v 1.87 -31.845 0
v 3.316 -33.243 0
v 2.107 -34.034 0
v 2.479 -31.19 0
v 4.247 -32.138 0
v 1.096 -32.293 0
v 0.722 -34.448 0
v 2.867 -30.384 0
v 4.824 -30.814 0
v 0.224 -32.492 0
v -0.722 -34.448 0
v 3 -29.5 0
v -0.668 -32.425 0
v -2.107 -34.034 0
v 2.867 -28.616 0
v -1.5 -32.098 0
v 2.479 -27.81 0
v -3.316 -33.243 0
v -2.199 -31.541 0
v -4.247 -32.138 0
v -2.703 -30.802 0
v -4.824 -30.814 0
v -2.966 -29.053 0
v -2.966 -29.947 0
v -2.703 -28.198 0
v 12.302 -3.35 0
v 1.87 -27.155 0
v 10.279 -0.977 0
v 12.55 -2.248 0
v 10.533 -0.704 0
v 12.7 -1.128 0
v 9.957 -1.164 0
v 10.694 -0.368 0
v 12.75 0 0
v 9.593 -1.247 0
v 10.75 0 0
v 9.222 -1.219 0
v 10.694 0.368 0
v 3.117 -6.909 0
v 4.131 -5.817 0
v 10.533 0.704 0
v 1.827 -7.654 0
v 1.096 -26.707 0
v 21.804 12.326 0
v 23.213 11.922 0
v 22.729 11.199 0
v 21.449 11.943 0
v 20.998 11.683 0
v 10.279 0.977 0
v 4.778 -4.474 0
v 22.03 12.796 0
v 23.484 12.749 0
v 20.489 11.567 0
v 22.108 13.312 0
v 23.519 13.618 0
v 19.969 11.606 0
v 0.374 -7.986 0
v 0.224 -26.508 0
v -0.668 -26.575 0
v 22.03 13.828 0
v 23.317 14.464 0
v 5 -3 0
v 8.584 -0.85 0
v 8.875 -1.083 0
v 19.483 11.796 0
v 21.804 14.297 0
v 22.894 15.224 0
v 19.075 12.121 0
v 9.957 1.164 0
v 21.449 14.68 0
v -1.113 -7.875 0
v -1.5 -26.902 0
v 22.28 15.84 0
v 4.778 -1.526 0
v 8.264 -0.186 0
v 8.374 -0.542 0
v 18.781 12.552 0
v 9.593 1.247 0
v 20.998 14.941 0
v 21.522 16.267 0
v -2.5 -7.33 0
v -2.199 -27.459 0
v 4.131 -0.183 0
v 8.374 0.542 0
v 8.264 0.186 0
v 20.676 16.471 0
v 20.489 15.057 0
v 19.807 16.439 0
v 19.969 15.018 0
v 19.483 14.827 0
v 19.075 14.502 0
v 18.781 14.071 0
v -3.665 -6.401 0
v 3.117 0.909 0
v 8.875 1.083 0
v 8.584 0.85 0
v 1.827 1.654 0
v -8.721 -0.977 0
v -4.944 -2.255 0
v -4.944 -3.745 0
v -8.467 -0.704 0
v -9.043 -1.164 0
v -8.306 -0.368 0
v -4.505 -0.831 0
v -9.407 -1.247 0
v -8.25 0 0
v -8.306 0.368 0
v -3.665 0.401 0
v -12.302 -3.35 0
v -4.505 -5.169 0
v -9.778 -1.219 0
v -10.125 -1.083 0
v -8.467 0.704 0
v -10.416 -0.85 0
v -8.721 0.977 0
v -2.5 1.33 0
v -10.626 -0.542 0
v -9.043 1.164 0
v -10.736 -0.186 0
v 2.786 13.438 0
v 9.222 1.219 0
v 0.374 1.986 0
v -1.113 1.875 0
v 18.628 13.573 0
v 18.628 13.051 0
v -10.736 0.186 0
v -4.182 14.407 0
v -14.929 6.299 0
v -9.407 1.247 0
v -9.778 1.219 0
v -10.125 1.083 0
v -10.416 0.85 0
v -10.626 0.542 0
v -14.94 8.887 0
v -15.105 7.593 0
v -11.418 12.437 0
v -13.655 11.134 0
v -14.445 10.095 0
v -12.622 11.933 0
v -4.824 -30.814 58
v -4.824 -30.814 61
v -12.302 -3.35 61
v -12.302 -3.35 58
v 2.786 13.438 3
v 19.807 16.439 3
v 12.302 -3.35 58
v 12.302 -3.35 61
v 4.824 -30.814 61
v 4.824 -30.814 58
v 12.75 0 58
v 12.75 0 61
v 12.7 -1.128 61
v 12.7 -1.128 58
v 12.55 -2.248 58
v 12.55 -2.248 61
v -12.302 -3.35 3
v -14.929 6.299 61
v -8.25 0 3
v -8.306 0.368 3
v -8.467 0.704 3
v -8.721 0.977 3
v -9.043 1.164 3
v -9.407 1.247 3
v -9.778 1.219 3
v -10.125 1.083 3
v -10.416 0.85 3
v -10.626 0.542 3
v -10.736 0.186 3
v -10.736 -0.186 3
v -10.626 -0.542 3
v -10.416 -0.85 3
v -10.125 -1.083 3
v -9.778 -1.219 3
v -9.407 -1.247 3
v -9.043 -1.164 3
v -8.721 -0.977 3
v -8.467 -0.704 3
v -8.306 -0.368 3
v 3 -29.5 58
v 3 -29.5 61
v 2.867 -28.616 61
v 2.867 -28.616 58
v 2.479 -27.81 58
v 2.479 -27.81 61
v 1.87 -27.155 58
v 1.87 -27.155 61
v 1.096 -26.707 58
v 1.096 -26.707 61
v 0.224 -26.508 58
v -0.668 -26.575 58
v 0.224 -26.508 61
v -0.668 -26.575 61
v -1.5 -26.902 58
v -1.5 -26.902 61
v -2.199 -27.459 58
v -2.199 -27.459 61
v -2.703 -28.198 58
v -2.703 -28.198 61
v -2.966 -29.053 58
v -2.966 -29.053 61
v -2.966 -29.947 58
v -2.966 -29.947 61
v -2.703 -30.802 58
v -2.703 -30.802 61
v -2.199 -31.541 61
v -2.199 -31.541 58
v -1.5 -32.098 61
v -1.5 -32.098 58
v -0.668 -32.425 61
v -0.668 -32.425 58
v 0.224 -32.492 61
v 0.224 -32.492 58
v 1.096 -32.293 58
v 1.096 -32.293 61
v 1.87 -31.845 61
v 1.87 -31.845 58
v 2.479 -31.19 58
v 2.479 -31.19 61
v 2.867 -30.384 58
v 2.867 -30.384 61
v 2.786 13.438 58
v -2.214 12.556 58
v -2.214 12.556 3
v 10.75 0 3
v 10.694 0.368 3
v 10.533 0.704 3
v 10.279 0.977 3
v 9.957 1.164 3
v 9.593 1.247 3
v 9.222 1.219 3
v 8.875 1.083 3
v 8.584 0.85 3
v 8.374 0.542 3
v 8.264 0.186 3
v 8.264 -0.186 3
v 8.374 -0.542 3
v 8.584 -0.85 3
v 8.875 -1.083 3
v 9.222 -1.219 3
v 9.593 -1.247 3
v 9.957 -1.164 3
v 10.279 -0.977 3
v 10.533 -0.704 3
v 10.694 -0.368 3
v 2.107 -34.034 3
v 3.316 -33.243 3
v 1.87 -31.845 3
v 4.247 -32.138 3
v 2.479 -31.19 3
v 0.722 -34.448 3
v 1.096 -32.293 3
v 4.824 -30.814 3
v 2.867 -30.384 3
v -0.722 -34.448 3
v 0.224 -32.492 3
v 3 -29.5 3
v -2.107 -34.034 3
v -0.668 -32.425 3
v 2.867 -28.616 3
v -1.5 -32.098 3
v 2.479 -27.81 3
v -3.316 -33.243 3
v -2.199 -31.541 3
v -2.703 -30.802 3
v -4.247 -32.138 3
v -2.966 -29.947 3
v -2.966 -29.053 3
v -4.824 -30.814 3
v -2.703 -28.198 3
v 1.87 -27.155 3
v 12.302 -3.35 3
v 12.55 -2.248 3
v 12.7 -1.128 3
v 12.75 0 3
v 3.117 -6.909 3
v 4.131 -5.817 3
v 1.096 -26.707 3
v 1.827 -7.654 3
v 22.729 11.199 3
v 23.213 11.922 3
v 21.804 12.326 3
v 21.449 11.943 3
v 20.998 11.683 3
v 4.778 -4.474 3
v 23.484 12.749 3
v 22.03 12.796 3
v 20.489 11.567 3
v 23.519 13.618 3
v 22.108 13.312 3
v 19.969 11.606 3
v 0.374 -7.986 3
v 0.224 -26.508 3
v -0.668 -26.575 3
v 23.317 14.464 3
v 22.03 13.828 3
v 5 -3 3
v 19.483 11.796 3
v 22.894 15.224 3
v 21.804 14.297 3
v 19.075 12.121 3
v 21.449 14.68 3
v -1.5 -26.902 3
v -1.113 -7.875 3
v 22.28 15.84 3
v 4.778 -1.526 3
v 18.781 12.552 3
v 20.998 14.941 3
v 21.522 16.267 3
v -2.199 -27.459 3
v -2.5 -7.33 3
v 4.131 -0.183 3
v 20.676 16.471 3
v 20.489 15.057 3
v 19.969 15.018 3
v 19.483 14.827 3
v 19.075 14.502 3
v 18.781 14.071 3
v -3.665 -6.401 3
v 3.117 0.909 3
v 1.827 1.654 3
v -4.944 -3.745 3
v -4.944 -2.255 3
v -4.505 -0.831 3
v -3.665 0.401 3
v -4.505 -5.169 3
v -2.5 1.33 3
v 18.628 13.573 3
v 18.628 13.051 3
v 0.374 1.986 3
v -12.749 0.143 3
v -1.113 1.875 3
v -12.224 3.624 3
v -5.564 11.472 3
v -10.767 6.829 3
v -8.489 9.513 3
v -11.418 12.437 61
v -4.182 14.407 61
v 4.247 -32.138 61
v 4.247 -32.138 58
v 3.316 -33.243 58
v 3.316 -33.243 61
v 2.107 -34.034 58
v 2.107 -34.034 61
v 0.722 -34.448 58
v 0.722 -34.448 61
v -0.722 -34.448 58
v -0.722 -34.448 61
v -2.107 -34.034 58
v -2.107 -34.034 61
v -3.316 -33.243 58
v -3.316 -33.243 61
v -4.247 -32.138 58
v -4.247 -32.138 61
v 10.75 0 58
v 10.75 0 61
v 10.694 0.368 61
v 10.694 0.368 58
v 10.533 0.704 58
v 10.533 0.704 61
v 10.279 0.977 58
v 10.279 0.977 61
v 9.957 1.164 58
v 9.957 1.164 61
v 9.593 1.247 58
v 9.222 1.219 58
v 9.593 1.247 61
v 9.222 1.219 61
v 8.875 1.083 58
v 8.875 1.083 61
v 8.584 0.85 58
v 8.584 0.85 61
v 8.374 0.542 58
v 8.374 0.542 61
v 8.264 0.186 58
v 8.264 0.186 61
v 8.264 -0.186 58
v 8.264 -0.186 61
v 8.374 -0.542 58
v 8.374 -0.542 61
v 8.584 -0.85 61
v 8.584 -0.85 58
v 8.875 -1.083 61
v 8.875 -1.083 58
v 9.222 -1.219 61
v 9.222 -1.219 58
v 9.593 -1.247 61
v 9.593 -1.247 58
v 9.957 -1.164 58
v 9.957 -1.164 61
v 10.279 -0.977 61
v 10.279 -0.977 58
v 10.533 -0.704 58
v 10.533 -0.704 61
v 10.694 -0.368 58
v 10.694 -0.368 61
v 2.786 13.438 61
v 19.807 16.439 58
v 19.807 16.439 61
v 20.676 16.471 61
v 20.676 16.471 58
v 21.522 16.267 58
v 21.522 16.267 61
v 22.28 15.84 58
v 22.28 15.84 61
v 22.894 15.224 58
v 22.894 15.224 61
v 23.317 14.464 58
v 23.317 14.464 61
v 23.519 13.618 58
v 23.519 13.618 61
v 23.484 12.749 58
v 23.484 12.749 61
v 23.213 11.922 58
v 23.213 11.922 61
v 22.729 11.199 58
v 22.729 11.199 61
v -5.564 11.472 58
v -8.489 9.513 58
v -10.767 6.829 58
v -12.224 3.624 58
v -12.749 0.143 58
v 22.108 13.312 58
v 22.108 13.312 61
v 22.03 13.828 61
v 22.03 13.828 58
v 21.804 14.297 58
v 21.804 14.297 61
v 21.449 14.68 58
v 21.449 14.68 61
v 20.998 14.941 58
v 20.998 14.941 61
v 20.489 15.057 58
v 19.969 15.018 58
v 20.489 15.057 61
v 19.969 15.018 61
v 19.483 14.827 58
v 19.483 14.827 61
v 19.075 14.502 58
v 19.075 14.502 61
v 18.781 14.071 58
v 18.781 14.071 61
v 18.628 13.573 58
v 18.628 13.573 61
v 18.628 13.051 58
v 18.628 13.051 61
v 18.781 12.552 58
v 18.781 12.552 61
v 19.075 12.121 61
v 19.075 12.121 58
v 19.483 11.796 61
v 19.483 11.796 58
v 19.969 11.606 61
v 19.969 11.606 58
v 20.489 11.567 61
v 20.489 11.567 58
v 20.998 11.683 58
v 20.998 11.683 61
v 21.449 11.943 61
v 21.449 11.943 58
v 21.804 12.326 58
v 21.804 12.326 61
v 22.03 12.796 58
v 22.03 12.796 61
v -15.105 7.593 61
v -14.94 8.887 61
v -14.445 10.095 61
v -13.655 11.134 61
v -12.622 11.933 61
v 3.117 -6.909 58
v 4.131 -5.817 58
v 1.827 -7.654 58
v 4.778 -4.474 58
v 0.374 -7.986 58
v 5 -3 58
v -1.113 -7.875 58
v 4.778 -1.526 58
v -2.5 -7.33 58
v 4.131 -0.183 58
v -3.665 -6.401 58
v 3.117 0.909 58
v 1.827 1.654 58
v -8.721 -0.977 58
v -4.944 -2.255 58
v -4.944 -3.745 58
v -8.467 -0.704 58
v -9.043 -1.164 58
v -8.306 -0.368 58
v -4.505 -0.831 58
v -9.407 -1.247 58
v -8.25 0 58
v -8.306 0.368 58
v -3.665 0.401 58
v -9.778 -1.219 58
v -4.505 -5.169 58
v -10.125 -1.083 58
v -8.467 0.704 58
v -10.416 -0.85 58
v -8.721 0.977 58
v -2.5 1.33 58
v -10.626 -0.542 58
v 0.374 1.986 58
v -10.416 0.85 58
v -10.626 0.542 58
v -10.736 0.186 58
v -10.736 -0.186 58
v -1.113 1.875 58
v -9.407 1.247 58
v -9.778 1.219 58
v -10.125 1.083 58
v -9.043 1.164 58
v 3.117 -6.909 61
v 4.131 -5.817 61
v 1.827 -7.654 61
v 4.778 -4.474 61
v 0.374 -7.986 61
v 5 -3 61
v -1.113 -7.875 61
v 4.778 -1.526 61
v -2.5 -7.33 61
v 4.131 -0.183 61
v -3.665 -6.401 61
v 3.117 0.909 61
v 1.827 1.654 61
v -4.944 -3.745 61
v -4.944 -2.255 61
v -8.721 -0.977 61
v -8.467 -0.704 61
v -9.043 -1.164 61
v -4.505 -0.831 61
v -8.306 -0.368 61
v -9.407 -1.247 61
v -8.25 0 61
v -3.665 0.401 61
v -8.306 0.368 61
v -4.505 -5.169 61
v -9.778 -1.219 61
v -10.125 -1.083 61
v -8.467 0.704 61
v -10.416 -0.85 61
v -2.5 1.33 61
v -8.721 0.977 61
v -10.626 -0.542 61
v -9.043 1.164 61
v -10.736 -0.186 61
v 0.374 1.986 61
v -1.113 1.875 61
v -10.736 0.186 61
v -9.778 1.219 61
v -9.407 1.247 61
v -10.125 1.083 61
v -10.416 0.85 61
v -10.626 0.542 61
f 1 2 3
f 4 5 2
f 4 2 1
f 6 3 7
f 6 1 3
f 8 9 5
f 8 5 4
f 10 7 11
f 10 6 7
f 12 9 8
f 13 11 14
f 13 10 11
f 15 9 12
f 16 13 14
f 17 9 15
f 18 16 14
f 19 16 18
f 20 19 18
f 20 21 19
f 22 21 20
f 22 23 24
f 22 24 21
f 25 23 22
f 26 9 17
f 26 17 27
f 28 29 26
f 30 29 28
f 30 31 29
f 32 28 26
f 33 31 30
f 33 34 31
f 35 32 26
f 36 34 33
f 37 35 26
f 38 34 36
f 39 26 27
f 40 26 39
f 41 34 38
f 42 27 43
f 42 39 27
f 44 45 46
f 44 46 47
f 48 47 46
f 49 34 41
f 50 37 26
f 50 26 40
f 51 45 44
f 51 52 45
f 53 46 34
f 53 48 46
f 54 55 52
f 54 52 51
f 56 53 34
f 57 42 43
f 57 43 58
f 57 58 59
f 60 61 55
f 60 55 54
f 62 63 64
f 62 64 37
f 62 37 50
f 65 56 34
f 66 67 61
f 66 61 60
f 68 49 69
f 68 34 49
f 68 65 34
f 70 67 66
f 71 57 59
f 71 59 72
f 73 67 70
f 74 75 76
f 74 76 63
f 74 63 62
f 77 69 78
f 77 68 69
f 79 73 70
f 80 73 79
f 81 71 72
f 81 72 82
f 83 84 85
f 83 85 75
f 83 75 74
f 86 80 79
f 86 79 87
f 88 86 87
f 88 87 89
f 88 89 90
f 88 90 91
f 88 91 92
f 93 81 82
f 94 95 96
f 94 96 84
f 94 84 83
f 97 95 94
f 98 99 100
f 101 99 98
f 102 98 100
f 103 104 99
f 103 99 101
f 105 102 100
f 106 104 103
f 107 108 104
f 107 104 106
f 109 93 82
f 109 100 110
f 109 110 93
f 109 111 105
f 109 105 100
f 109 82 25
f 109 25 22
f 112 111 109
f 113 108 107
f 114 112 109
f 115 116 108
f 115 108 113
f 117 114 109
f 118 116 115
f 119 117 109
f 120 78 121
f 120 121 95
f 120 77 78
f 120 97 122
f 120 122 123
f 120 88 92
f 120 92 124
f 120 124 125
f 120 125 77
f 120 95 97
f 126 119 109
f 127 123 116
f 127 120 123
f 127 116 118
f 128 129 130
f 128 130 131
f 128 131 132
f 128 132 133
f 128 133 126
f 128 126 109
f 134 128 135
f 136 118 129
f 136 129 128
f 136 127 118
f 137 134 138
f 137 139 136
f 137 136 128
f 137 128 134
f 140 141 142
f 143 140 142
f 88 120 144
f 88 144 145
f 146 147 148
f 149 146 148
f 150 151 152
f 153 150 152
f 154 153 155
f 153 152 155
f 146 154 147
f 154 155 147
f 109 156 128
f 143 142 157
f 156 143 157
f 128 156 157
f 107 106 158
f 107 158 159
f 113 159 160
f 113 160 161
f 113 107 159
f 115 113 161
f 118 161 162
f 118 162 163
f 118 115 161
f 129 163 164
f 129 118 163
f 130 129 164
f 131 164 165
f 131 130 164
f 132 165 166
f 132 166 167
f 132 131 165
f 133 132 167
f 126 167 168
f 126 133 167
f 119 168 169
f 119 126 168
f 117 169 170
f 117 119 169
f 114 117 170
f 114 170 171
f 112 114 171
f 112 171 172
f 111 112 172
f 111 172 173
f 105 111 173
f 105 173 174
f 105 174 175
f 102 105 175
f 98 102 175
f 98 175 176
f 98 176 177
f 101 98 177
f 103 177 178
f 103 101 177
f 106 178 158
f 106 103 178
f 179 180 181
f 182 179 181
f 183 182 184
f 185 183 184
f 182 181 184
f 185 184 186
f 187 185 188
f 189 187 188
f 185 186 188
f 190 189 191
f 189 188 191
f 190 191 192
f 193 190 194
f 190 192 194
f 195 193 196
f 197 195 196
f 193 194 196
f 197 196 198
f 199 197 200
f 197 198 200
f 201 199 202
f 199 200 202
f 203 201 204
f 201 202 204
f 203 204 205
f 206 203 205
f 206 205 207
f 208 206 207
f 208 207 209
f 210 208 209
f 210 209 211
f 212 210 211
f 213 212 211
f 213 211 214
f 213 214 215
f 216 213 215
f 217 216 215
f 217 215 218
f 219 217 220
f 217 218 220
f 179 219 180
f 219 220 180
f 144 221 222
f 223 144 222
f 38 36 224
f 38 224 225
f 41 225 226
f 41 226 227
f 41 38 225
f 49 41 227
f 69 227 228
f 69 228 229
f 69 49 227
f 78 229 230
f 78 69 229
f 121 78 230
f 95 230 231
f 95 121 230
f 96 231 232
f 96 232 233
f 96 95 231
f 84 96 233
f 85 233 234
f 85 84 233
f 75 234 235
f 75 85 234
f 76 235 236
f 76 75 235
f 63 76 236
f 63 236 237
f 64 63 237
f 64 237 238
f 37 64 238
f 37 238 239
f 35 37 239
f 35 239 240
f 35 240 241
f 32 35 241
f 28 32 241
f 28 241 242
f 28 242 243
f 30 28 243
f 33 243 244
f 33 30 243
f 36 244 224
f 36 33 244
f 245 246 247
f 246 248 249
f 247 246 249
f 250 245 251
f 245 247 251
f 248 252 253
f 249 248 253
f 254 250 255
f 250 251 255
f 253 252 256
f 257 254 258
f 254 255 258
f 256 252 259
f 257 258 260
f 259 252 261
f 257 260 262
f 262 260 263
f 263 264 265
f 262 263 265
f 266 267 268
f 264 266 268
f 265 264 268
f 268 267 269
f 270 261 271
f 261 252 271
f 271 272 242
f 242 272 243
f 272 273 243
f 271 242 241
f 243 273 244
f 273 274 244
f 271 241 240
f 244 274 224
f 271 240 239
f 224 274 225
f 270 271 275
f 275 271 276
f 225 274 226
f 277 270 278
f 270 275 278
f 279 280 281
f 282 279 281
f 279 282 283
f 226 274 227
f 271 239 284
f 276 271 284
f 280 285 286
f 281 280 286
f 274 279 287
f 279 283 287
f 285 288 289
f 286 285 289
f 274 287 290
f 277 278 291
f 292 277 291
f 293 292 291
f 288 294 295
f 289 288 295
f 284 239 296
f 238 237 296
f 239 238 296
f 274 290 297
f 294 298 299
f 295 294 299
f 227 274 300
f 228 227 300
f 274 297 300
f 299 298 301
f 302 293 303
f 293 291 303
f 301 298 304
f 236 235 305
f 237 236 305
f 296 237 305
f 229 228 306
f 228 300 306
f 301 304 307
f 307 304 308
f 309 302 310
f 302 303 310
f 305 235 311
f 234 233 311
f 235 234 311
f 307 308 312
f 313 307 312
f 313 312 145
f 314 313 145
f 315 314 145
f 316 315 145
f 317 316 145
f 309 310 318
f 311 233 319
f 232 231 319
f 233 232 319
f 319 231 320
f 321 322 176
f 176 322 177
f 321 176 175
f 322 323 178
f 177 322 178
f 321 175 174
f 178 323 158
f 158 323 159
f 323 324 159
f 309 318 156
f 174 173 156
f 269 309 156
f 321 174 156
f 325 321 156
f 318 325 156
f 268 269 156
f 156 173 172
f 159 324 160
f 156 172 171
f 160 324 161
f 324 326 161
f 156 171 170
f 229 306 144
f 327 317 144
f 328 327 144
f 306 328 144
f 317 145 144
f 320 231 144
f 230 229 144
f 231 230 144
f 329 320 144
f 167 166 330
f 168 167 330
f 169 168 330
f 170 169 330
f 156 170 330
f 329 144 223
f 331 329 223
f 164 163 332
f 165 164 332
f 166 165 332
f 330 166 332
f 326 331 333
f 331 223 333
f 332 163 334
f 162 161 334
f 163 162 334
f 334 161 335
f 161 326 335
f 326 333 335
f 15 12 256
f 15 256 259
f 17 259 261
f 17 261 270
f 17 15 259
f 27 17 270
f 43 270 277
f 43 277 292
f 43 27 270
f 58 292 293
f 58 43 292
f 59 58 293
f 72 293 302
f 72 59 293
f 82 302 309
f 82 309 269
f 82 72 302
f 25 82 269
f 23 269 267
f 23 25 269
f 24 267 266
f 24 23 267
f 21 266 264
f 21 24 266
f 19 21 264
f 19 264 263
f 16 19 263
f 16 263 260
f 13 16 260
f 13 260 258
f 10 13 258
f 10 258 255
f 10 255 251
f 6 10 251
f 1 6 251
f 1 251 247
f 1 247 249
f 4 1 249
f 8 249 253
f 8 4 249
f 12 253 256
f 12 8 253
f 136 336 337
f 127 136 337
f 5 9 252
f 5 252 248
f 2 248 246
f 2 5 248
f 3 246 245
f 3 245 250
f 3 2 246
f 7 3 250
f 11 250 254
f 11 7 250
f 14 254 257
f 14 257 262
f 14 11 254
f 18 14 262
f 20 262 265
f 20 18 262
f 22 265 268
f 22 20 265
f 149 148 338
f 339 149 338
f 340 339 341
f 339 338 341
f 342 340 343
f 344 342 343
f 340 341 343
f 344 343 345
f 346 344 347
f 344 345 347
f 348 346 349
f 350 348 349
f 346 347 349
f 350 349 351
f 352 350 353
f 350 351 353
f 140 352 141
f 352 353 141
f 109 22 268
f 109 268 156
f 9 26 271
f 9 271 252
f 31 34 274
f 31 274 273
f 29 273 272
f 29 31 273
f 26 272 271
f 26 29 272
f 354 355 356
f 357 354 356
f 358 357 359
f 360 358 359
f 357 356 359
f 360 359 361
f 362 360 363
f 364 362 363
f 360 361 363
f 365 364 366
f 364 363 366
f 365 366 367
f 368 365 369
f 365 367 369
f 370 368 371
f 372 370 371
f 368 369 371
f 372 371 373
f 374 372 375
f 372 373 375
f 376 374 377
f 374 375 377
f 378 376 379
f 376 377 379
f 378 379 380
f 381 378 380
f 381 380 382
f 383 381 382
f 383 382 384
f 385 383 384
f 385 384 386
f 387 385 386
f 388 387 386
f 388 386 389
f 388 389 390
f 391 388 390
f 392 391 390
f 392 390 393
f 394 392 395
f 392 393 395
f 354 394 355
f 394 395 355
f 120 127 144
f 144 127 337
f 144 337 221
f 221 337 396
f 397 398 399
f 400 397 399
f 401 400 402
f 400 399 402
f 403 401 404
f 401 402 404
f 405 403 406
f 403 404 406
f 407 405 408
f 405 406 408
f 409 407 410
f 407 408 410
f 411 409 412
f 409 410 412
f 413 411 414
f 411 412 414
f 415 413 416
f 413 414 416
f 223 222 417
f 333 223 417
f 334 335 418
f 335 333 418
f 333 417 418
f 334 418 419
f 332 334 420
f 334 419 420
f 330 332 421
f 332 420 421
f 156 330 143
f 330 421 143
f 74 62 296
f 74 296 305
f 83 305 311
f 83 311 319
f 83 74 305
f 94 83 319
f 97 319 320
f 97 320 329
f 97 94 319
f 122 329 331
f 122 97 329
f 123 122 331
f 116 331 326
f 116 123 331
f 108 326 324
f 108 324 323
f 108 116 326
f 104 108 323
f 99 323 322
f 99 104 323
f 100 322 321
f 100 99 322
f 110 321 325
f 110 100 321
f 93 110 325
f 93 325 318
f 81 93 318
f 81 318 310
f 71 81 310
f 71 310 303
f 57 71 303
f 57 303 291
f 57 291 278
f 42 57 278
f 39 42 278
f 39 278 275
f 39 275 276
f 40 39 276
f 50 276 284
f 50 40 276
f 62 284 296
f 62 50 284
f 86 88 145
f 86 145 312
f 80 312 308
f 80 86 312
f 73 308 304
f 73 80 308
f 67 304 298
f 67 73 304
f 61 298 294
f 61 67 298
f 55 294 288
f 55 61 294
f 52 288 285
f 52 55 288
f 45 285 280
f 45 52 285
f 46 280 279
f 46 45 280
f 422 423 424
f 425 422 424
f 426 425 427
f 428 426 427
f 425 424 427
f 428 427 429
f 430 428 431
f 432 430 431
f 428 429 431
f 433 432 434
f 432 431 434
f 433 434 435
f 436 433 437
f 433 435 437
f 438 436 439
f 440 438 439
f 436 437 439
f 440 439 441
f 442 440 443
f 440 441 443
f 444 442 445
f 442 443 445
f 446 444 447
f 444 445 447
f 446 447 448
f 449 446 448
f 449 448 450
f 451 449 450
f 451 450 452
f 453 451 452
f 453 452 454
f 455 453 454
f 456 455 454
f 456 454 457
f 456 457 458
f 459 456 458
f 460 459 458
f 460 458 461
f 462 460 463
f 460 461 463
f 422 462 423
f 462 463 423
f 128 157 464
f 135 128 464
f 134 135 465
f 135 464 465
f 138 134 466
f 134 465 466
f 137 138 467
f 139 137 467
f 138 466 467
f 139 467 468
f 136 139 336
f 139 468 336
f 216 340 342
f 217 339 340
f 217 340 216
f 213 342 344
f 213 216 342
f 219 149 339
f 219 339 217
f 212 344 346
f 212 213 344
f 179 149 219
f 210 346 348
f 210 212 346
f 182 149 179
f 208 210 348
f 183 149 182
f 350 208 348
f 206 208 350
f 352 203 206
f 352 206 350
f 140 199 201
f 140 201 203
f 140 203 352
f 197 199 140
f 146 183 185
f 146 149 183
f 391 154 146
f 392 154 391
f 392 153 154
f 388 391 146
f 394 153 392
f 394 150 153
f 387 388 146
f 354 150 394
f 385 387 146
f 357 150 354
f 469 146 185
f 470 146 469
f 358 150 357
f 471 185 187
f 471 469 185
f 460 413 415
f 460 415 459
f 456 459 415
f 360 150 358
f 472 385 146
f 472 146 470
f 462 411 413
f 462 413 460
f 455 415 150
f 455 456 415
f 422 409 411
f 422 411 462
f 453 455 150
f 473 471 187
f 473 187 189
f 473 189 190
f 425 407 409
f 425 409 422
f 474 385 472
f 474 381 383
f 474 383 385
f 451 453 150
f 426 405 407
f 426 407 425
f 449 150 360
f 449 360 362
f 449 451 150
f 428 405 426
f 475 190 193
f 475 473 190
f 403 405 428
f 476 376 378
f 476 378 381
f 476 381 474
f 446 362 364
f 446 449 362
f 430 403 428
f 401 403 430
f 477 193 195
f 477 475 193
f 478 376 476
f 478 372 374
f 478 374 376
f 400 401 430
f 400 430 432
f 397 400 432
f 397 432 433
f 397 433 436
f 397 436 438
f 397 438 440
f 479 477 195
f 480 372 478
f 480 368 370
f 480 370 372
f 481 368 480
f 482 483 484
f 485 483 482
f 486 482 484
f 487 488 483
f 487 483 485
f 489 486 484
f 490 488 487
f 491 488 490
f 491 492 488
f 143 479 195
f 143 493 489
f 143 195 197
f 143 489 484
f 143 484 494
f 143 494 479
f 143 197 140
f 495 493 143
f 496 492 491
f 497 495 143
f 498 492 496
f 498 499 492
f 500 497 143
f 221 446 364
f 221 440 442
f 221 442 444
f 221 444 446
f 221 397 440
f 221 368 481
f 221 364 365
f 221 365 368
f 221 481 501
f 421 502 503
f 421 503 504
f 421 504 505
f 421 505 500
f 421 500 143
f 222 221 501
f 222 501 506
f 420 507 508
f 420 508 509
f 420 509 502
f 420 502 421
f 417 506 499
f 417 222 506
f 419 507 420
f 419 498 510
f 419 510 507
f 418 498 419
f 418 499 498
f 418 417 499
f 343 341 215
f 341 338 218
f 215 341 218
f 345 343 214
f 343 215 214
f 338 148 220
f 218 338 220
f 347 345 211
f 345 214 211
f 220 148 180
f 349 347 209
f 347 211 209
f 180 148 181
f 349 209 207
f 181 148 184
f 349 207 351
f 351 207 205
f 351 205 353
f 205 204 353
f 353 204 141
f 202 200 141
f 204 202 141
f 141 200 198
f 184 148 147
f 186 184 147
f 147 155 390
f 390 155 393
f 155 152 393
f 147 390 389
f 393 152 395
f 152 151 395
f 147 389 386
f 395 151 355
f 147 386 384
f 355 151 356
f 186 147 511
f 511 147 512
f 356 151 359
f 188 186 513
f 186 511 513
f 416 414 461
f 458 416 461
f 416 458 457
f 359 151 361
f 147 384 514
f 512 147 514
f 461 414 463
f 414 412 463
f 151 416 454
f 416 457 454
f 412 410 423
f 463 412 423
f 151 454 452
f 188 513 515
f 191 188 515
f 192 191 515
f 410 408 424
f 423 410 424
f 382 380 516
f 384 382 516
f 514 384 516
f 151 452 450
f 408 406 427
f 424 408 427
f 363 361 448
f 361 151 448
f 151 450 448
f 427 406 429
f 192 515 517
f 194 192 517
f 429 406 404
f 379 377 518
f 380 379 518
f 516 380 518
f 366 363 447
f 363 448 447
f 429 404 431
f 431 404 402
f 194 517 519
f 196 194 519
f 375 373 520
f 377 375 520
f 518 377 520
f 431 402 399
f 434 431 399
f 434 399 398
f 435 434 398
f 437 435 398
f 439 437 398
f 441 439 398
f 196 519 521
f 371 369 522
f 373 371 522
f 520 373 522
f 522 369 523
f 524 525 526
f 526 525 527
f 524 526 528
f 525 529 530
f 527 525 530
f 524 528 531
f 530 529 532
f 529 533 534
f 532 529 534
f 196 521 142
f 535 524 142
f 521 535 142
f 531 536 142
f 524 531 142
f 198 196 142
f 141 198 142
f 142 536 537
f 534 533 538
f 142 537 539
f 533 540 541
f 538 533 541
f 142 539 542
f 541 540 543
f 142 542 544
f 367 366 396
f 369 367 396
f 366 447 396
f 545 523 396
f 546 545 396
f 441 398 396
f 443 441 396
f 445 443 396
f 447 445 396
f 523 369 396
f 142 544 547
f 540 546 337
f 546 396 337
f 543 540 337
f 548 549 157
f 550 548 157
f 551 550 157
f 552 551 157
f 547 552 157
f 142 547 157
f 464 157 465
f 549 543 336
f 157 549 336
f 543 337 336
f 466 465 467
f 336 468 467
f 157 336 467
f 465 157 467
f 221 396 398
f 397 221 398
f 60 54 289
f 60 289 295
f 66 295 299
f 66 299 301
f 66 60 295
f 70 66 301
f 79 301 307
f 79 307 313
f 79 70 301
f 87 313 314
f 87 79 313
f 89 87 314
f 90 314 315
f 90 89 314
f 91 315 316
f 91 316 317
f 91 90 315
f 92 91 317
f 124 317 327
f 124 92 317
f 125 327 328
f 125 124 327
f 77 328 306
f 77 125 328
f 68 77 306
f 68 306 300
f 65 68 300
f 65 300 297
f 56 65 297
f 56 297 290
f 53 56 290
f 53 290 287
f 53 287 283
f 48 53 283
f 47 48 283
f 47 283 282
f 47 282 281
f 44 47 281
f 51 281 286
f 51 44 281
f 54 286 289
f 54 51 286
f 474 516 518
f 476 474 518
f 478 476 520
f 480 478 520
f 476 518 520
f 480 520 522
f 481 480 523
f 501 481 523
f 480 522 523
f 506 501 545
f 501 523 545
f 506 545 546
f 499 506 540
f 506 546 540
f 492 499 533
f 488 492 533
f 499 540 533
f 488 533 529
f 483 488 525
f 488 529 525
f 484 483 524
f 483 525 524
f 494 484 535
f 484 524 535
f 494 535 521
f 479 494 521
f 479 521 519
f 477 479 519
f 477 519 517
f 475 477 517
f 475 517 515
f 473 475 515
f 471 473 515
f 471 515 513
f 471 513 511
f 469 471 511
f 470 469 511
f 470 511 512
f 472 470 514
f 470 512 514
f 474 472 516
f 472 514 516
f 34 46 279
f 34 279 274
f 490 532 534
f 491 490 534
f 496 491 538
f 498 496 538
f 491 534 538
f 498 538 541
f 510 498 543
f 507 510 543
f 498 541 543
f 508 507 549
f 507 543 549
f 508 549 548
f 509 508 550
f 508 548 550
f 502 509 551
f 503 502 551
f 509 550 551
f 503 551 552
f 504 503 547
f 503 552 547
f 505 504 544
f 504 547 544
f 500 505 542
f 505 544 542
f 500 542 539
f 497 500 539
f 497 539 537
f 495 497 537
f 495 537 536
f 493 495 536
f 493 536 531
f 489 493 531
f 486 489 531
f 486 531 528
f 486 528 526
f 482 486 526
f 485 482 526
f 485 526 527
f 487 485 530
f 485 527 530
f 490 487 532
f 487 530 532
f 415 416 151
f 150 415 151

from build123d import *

# Parameters (mm, degrees)
SKETCH1_R           = 3
SKETCH1_R_2         = 5
SKETCH1_R_3         = 1.25
BOSS_EXTRUDE1_DEPTH = 3
SKETCH2_R           = 1.75
BOSS_EXTRUDE2_DEPTH = 3
BOSS_EXTRUDE3_DEPTH = 30.5


with BuildPart() as part:
    # Sketch1 → Boss-Extrude1 (new body)
    with BuildSketch(Plane.XY):
        with BuildLine():
            Line((-4.824371659, -30.813559322), (-12.302147731, -3.349576271))
            ThreePointArc((-12.302147731, -3.349576271), (0, 12.75), (12.302147731, -3.349576271))
            Line((12.302147731, -3.349576271), (4.824371659, -30.813559322))
            ThreePointArc((4.824371659, -30.813559322), (0, -34.5), (-4.824371659, -30.813559322))
        make_face()
        with Locations((0, -29.5)):
            Circle(SKETCH1_R, mode=Mode.SUBTRACT)
        with Locations((0, -3)):
            Circle(SKETCH1_R_2, mode=Mode.SUBTRACT)
        with Locations((-9.5, 0)):
            Circle(SKETCH1_R_3, mode=Mode.SUBTRACT)
        with Locations((9.5, 0)):
            Circle(SKETCH1_R_3, mode=Mode.SUBTRACT)
    boss_extrude1 = extrude(amount=BOSS_EXTRUDE1_DEPTH)

    # Sketch2 → Boss-Extrude2 (add)
    with BuildSketch(Plane.XY):
        with BuildLine():
            Line((-2.214014265, 12.556298851), (19.806700742, 16.439145041))
            ThreePointArc((19.806700742, 16.439145041), (23.131694024, 14.858482542), (22.729129297, 11.198972206))
            Line((22.729129297, 11.198972206), (12.75, 0))
            ThreePointArc((12.75, 0), (8.195542024, 9.76706665), (-2.214014265, 12.556298851))
        make_face()
        with Locations((20.358155694, 13.311688597)):
            Circle(SKETCH2_R, mode=Mode.SUBTRACT)
    boss_extrude2 = extrude(amount=BOSS_EXTRUDE2_DEPTH)

    # Sketch4 → Boss-Extrude3 (add)
    with BuildSketch(Plane.XY):
        with BuildLine():
            Line((-12.302147731, -3.349576271), (-14.929266375, 6.299167048))
            ThreePointArc((-14.929266375, 6.299167048), (-14.445067335, 10.095245581), (-11.418454038, 12.437098029))
            Line((-11.418454038, 12.437098029), (-4.181896549, 14.407437012))
            Line((-4.181896549, 14.407437012), (2.785985735, 13.437933754))
            Line((2.785985735, 13.437933754), (-2.214014265, 12.556298851))
            ThreePointArc((-2.214014265, 12.556298851), (-10.767030957, 6.828875777), (-12.302147731, -3.349576271))
        make_face()
    boss_extrude3 = extrude(amount=BOSS_EXTRUDE3_DEPTH)

    # Mirror2: Boss-Extrude1, Boss-Extrude2, Boss-Extrude3 across plane
    add(boss_extrude1.mirror(Plane.XY.offset(30.5)))
    add(boss_extrude2.mirror(Plane.XY.offset(30.5)))
    add(boss_extrude3.mirror(Plane.XY.offset(30.5)))


solid = part.part
